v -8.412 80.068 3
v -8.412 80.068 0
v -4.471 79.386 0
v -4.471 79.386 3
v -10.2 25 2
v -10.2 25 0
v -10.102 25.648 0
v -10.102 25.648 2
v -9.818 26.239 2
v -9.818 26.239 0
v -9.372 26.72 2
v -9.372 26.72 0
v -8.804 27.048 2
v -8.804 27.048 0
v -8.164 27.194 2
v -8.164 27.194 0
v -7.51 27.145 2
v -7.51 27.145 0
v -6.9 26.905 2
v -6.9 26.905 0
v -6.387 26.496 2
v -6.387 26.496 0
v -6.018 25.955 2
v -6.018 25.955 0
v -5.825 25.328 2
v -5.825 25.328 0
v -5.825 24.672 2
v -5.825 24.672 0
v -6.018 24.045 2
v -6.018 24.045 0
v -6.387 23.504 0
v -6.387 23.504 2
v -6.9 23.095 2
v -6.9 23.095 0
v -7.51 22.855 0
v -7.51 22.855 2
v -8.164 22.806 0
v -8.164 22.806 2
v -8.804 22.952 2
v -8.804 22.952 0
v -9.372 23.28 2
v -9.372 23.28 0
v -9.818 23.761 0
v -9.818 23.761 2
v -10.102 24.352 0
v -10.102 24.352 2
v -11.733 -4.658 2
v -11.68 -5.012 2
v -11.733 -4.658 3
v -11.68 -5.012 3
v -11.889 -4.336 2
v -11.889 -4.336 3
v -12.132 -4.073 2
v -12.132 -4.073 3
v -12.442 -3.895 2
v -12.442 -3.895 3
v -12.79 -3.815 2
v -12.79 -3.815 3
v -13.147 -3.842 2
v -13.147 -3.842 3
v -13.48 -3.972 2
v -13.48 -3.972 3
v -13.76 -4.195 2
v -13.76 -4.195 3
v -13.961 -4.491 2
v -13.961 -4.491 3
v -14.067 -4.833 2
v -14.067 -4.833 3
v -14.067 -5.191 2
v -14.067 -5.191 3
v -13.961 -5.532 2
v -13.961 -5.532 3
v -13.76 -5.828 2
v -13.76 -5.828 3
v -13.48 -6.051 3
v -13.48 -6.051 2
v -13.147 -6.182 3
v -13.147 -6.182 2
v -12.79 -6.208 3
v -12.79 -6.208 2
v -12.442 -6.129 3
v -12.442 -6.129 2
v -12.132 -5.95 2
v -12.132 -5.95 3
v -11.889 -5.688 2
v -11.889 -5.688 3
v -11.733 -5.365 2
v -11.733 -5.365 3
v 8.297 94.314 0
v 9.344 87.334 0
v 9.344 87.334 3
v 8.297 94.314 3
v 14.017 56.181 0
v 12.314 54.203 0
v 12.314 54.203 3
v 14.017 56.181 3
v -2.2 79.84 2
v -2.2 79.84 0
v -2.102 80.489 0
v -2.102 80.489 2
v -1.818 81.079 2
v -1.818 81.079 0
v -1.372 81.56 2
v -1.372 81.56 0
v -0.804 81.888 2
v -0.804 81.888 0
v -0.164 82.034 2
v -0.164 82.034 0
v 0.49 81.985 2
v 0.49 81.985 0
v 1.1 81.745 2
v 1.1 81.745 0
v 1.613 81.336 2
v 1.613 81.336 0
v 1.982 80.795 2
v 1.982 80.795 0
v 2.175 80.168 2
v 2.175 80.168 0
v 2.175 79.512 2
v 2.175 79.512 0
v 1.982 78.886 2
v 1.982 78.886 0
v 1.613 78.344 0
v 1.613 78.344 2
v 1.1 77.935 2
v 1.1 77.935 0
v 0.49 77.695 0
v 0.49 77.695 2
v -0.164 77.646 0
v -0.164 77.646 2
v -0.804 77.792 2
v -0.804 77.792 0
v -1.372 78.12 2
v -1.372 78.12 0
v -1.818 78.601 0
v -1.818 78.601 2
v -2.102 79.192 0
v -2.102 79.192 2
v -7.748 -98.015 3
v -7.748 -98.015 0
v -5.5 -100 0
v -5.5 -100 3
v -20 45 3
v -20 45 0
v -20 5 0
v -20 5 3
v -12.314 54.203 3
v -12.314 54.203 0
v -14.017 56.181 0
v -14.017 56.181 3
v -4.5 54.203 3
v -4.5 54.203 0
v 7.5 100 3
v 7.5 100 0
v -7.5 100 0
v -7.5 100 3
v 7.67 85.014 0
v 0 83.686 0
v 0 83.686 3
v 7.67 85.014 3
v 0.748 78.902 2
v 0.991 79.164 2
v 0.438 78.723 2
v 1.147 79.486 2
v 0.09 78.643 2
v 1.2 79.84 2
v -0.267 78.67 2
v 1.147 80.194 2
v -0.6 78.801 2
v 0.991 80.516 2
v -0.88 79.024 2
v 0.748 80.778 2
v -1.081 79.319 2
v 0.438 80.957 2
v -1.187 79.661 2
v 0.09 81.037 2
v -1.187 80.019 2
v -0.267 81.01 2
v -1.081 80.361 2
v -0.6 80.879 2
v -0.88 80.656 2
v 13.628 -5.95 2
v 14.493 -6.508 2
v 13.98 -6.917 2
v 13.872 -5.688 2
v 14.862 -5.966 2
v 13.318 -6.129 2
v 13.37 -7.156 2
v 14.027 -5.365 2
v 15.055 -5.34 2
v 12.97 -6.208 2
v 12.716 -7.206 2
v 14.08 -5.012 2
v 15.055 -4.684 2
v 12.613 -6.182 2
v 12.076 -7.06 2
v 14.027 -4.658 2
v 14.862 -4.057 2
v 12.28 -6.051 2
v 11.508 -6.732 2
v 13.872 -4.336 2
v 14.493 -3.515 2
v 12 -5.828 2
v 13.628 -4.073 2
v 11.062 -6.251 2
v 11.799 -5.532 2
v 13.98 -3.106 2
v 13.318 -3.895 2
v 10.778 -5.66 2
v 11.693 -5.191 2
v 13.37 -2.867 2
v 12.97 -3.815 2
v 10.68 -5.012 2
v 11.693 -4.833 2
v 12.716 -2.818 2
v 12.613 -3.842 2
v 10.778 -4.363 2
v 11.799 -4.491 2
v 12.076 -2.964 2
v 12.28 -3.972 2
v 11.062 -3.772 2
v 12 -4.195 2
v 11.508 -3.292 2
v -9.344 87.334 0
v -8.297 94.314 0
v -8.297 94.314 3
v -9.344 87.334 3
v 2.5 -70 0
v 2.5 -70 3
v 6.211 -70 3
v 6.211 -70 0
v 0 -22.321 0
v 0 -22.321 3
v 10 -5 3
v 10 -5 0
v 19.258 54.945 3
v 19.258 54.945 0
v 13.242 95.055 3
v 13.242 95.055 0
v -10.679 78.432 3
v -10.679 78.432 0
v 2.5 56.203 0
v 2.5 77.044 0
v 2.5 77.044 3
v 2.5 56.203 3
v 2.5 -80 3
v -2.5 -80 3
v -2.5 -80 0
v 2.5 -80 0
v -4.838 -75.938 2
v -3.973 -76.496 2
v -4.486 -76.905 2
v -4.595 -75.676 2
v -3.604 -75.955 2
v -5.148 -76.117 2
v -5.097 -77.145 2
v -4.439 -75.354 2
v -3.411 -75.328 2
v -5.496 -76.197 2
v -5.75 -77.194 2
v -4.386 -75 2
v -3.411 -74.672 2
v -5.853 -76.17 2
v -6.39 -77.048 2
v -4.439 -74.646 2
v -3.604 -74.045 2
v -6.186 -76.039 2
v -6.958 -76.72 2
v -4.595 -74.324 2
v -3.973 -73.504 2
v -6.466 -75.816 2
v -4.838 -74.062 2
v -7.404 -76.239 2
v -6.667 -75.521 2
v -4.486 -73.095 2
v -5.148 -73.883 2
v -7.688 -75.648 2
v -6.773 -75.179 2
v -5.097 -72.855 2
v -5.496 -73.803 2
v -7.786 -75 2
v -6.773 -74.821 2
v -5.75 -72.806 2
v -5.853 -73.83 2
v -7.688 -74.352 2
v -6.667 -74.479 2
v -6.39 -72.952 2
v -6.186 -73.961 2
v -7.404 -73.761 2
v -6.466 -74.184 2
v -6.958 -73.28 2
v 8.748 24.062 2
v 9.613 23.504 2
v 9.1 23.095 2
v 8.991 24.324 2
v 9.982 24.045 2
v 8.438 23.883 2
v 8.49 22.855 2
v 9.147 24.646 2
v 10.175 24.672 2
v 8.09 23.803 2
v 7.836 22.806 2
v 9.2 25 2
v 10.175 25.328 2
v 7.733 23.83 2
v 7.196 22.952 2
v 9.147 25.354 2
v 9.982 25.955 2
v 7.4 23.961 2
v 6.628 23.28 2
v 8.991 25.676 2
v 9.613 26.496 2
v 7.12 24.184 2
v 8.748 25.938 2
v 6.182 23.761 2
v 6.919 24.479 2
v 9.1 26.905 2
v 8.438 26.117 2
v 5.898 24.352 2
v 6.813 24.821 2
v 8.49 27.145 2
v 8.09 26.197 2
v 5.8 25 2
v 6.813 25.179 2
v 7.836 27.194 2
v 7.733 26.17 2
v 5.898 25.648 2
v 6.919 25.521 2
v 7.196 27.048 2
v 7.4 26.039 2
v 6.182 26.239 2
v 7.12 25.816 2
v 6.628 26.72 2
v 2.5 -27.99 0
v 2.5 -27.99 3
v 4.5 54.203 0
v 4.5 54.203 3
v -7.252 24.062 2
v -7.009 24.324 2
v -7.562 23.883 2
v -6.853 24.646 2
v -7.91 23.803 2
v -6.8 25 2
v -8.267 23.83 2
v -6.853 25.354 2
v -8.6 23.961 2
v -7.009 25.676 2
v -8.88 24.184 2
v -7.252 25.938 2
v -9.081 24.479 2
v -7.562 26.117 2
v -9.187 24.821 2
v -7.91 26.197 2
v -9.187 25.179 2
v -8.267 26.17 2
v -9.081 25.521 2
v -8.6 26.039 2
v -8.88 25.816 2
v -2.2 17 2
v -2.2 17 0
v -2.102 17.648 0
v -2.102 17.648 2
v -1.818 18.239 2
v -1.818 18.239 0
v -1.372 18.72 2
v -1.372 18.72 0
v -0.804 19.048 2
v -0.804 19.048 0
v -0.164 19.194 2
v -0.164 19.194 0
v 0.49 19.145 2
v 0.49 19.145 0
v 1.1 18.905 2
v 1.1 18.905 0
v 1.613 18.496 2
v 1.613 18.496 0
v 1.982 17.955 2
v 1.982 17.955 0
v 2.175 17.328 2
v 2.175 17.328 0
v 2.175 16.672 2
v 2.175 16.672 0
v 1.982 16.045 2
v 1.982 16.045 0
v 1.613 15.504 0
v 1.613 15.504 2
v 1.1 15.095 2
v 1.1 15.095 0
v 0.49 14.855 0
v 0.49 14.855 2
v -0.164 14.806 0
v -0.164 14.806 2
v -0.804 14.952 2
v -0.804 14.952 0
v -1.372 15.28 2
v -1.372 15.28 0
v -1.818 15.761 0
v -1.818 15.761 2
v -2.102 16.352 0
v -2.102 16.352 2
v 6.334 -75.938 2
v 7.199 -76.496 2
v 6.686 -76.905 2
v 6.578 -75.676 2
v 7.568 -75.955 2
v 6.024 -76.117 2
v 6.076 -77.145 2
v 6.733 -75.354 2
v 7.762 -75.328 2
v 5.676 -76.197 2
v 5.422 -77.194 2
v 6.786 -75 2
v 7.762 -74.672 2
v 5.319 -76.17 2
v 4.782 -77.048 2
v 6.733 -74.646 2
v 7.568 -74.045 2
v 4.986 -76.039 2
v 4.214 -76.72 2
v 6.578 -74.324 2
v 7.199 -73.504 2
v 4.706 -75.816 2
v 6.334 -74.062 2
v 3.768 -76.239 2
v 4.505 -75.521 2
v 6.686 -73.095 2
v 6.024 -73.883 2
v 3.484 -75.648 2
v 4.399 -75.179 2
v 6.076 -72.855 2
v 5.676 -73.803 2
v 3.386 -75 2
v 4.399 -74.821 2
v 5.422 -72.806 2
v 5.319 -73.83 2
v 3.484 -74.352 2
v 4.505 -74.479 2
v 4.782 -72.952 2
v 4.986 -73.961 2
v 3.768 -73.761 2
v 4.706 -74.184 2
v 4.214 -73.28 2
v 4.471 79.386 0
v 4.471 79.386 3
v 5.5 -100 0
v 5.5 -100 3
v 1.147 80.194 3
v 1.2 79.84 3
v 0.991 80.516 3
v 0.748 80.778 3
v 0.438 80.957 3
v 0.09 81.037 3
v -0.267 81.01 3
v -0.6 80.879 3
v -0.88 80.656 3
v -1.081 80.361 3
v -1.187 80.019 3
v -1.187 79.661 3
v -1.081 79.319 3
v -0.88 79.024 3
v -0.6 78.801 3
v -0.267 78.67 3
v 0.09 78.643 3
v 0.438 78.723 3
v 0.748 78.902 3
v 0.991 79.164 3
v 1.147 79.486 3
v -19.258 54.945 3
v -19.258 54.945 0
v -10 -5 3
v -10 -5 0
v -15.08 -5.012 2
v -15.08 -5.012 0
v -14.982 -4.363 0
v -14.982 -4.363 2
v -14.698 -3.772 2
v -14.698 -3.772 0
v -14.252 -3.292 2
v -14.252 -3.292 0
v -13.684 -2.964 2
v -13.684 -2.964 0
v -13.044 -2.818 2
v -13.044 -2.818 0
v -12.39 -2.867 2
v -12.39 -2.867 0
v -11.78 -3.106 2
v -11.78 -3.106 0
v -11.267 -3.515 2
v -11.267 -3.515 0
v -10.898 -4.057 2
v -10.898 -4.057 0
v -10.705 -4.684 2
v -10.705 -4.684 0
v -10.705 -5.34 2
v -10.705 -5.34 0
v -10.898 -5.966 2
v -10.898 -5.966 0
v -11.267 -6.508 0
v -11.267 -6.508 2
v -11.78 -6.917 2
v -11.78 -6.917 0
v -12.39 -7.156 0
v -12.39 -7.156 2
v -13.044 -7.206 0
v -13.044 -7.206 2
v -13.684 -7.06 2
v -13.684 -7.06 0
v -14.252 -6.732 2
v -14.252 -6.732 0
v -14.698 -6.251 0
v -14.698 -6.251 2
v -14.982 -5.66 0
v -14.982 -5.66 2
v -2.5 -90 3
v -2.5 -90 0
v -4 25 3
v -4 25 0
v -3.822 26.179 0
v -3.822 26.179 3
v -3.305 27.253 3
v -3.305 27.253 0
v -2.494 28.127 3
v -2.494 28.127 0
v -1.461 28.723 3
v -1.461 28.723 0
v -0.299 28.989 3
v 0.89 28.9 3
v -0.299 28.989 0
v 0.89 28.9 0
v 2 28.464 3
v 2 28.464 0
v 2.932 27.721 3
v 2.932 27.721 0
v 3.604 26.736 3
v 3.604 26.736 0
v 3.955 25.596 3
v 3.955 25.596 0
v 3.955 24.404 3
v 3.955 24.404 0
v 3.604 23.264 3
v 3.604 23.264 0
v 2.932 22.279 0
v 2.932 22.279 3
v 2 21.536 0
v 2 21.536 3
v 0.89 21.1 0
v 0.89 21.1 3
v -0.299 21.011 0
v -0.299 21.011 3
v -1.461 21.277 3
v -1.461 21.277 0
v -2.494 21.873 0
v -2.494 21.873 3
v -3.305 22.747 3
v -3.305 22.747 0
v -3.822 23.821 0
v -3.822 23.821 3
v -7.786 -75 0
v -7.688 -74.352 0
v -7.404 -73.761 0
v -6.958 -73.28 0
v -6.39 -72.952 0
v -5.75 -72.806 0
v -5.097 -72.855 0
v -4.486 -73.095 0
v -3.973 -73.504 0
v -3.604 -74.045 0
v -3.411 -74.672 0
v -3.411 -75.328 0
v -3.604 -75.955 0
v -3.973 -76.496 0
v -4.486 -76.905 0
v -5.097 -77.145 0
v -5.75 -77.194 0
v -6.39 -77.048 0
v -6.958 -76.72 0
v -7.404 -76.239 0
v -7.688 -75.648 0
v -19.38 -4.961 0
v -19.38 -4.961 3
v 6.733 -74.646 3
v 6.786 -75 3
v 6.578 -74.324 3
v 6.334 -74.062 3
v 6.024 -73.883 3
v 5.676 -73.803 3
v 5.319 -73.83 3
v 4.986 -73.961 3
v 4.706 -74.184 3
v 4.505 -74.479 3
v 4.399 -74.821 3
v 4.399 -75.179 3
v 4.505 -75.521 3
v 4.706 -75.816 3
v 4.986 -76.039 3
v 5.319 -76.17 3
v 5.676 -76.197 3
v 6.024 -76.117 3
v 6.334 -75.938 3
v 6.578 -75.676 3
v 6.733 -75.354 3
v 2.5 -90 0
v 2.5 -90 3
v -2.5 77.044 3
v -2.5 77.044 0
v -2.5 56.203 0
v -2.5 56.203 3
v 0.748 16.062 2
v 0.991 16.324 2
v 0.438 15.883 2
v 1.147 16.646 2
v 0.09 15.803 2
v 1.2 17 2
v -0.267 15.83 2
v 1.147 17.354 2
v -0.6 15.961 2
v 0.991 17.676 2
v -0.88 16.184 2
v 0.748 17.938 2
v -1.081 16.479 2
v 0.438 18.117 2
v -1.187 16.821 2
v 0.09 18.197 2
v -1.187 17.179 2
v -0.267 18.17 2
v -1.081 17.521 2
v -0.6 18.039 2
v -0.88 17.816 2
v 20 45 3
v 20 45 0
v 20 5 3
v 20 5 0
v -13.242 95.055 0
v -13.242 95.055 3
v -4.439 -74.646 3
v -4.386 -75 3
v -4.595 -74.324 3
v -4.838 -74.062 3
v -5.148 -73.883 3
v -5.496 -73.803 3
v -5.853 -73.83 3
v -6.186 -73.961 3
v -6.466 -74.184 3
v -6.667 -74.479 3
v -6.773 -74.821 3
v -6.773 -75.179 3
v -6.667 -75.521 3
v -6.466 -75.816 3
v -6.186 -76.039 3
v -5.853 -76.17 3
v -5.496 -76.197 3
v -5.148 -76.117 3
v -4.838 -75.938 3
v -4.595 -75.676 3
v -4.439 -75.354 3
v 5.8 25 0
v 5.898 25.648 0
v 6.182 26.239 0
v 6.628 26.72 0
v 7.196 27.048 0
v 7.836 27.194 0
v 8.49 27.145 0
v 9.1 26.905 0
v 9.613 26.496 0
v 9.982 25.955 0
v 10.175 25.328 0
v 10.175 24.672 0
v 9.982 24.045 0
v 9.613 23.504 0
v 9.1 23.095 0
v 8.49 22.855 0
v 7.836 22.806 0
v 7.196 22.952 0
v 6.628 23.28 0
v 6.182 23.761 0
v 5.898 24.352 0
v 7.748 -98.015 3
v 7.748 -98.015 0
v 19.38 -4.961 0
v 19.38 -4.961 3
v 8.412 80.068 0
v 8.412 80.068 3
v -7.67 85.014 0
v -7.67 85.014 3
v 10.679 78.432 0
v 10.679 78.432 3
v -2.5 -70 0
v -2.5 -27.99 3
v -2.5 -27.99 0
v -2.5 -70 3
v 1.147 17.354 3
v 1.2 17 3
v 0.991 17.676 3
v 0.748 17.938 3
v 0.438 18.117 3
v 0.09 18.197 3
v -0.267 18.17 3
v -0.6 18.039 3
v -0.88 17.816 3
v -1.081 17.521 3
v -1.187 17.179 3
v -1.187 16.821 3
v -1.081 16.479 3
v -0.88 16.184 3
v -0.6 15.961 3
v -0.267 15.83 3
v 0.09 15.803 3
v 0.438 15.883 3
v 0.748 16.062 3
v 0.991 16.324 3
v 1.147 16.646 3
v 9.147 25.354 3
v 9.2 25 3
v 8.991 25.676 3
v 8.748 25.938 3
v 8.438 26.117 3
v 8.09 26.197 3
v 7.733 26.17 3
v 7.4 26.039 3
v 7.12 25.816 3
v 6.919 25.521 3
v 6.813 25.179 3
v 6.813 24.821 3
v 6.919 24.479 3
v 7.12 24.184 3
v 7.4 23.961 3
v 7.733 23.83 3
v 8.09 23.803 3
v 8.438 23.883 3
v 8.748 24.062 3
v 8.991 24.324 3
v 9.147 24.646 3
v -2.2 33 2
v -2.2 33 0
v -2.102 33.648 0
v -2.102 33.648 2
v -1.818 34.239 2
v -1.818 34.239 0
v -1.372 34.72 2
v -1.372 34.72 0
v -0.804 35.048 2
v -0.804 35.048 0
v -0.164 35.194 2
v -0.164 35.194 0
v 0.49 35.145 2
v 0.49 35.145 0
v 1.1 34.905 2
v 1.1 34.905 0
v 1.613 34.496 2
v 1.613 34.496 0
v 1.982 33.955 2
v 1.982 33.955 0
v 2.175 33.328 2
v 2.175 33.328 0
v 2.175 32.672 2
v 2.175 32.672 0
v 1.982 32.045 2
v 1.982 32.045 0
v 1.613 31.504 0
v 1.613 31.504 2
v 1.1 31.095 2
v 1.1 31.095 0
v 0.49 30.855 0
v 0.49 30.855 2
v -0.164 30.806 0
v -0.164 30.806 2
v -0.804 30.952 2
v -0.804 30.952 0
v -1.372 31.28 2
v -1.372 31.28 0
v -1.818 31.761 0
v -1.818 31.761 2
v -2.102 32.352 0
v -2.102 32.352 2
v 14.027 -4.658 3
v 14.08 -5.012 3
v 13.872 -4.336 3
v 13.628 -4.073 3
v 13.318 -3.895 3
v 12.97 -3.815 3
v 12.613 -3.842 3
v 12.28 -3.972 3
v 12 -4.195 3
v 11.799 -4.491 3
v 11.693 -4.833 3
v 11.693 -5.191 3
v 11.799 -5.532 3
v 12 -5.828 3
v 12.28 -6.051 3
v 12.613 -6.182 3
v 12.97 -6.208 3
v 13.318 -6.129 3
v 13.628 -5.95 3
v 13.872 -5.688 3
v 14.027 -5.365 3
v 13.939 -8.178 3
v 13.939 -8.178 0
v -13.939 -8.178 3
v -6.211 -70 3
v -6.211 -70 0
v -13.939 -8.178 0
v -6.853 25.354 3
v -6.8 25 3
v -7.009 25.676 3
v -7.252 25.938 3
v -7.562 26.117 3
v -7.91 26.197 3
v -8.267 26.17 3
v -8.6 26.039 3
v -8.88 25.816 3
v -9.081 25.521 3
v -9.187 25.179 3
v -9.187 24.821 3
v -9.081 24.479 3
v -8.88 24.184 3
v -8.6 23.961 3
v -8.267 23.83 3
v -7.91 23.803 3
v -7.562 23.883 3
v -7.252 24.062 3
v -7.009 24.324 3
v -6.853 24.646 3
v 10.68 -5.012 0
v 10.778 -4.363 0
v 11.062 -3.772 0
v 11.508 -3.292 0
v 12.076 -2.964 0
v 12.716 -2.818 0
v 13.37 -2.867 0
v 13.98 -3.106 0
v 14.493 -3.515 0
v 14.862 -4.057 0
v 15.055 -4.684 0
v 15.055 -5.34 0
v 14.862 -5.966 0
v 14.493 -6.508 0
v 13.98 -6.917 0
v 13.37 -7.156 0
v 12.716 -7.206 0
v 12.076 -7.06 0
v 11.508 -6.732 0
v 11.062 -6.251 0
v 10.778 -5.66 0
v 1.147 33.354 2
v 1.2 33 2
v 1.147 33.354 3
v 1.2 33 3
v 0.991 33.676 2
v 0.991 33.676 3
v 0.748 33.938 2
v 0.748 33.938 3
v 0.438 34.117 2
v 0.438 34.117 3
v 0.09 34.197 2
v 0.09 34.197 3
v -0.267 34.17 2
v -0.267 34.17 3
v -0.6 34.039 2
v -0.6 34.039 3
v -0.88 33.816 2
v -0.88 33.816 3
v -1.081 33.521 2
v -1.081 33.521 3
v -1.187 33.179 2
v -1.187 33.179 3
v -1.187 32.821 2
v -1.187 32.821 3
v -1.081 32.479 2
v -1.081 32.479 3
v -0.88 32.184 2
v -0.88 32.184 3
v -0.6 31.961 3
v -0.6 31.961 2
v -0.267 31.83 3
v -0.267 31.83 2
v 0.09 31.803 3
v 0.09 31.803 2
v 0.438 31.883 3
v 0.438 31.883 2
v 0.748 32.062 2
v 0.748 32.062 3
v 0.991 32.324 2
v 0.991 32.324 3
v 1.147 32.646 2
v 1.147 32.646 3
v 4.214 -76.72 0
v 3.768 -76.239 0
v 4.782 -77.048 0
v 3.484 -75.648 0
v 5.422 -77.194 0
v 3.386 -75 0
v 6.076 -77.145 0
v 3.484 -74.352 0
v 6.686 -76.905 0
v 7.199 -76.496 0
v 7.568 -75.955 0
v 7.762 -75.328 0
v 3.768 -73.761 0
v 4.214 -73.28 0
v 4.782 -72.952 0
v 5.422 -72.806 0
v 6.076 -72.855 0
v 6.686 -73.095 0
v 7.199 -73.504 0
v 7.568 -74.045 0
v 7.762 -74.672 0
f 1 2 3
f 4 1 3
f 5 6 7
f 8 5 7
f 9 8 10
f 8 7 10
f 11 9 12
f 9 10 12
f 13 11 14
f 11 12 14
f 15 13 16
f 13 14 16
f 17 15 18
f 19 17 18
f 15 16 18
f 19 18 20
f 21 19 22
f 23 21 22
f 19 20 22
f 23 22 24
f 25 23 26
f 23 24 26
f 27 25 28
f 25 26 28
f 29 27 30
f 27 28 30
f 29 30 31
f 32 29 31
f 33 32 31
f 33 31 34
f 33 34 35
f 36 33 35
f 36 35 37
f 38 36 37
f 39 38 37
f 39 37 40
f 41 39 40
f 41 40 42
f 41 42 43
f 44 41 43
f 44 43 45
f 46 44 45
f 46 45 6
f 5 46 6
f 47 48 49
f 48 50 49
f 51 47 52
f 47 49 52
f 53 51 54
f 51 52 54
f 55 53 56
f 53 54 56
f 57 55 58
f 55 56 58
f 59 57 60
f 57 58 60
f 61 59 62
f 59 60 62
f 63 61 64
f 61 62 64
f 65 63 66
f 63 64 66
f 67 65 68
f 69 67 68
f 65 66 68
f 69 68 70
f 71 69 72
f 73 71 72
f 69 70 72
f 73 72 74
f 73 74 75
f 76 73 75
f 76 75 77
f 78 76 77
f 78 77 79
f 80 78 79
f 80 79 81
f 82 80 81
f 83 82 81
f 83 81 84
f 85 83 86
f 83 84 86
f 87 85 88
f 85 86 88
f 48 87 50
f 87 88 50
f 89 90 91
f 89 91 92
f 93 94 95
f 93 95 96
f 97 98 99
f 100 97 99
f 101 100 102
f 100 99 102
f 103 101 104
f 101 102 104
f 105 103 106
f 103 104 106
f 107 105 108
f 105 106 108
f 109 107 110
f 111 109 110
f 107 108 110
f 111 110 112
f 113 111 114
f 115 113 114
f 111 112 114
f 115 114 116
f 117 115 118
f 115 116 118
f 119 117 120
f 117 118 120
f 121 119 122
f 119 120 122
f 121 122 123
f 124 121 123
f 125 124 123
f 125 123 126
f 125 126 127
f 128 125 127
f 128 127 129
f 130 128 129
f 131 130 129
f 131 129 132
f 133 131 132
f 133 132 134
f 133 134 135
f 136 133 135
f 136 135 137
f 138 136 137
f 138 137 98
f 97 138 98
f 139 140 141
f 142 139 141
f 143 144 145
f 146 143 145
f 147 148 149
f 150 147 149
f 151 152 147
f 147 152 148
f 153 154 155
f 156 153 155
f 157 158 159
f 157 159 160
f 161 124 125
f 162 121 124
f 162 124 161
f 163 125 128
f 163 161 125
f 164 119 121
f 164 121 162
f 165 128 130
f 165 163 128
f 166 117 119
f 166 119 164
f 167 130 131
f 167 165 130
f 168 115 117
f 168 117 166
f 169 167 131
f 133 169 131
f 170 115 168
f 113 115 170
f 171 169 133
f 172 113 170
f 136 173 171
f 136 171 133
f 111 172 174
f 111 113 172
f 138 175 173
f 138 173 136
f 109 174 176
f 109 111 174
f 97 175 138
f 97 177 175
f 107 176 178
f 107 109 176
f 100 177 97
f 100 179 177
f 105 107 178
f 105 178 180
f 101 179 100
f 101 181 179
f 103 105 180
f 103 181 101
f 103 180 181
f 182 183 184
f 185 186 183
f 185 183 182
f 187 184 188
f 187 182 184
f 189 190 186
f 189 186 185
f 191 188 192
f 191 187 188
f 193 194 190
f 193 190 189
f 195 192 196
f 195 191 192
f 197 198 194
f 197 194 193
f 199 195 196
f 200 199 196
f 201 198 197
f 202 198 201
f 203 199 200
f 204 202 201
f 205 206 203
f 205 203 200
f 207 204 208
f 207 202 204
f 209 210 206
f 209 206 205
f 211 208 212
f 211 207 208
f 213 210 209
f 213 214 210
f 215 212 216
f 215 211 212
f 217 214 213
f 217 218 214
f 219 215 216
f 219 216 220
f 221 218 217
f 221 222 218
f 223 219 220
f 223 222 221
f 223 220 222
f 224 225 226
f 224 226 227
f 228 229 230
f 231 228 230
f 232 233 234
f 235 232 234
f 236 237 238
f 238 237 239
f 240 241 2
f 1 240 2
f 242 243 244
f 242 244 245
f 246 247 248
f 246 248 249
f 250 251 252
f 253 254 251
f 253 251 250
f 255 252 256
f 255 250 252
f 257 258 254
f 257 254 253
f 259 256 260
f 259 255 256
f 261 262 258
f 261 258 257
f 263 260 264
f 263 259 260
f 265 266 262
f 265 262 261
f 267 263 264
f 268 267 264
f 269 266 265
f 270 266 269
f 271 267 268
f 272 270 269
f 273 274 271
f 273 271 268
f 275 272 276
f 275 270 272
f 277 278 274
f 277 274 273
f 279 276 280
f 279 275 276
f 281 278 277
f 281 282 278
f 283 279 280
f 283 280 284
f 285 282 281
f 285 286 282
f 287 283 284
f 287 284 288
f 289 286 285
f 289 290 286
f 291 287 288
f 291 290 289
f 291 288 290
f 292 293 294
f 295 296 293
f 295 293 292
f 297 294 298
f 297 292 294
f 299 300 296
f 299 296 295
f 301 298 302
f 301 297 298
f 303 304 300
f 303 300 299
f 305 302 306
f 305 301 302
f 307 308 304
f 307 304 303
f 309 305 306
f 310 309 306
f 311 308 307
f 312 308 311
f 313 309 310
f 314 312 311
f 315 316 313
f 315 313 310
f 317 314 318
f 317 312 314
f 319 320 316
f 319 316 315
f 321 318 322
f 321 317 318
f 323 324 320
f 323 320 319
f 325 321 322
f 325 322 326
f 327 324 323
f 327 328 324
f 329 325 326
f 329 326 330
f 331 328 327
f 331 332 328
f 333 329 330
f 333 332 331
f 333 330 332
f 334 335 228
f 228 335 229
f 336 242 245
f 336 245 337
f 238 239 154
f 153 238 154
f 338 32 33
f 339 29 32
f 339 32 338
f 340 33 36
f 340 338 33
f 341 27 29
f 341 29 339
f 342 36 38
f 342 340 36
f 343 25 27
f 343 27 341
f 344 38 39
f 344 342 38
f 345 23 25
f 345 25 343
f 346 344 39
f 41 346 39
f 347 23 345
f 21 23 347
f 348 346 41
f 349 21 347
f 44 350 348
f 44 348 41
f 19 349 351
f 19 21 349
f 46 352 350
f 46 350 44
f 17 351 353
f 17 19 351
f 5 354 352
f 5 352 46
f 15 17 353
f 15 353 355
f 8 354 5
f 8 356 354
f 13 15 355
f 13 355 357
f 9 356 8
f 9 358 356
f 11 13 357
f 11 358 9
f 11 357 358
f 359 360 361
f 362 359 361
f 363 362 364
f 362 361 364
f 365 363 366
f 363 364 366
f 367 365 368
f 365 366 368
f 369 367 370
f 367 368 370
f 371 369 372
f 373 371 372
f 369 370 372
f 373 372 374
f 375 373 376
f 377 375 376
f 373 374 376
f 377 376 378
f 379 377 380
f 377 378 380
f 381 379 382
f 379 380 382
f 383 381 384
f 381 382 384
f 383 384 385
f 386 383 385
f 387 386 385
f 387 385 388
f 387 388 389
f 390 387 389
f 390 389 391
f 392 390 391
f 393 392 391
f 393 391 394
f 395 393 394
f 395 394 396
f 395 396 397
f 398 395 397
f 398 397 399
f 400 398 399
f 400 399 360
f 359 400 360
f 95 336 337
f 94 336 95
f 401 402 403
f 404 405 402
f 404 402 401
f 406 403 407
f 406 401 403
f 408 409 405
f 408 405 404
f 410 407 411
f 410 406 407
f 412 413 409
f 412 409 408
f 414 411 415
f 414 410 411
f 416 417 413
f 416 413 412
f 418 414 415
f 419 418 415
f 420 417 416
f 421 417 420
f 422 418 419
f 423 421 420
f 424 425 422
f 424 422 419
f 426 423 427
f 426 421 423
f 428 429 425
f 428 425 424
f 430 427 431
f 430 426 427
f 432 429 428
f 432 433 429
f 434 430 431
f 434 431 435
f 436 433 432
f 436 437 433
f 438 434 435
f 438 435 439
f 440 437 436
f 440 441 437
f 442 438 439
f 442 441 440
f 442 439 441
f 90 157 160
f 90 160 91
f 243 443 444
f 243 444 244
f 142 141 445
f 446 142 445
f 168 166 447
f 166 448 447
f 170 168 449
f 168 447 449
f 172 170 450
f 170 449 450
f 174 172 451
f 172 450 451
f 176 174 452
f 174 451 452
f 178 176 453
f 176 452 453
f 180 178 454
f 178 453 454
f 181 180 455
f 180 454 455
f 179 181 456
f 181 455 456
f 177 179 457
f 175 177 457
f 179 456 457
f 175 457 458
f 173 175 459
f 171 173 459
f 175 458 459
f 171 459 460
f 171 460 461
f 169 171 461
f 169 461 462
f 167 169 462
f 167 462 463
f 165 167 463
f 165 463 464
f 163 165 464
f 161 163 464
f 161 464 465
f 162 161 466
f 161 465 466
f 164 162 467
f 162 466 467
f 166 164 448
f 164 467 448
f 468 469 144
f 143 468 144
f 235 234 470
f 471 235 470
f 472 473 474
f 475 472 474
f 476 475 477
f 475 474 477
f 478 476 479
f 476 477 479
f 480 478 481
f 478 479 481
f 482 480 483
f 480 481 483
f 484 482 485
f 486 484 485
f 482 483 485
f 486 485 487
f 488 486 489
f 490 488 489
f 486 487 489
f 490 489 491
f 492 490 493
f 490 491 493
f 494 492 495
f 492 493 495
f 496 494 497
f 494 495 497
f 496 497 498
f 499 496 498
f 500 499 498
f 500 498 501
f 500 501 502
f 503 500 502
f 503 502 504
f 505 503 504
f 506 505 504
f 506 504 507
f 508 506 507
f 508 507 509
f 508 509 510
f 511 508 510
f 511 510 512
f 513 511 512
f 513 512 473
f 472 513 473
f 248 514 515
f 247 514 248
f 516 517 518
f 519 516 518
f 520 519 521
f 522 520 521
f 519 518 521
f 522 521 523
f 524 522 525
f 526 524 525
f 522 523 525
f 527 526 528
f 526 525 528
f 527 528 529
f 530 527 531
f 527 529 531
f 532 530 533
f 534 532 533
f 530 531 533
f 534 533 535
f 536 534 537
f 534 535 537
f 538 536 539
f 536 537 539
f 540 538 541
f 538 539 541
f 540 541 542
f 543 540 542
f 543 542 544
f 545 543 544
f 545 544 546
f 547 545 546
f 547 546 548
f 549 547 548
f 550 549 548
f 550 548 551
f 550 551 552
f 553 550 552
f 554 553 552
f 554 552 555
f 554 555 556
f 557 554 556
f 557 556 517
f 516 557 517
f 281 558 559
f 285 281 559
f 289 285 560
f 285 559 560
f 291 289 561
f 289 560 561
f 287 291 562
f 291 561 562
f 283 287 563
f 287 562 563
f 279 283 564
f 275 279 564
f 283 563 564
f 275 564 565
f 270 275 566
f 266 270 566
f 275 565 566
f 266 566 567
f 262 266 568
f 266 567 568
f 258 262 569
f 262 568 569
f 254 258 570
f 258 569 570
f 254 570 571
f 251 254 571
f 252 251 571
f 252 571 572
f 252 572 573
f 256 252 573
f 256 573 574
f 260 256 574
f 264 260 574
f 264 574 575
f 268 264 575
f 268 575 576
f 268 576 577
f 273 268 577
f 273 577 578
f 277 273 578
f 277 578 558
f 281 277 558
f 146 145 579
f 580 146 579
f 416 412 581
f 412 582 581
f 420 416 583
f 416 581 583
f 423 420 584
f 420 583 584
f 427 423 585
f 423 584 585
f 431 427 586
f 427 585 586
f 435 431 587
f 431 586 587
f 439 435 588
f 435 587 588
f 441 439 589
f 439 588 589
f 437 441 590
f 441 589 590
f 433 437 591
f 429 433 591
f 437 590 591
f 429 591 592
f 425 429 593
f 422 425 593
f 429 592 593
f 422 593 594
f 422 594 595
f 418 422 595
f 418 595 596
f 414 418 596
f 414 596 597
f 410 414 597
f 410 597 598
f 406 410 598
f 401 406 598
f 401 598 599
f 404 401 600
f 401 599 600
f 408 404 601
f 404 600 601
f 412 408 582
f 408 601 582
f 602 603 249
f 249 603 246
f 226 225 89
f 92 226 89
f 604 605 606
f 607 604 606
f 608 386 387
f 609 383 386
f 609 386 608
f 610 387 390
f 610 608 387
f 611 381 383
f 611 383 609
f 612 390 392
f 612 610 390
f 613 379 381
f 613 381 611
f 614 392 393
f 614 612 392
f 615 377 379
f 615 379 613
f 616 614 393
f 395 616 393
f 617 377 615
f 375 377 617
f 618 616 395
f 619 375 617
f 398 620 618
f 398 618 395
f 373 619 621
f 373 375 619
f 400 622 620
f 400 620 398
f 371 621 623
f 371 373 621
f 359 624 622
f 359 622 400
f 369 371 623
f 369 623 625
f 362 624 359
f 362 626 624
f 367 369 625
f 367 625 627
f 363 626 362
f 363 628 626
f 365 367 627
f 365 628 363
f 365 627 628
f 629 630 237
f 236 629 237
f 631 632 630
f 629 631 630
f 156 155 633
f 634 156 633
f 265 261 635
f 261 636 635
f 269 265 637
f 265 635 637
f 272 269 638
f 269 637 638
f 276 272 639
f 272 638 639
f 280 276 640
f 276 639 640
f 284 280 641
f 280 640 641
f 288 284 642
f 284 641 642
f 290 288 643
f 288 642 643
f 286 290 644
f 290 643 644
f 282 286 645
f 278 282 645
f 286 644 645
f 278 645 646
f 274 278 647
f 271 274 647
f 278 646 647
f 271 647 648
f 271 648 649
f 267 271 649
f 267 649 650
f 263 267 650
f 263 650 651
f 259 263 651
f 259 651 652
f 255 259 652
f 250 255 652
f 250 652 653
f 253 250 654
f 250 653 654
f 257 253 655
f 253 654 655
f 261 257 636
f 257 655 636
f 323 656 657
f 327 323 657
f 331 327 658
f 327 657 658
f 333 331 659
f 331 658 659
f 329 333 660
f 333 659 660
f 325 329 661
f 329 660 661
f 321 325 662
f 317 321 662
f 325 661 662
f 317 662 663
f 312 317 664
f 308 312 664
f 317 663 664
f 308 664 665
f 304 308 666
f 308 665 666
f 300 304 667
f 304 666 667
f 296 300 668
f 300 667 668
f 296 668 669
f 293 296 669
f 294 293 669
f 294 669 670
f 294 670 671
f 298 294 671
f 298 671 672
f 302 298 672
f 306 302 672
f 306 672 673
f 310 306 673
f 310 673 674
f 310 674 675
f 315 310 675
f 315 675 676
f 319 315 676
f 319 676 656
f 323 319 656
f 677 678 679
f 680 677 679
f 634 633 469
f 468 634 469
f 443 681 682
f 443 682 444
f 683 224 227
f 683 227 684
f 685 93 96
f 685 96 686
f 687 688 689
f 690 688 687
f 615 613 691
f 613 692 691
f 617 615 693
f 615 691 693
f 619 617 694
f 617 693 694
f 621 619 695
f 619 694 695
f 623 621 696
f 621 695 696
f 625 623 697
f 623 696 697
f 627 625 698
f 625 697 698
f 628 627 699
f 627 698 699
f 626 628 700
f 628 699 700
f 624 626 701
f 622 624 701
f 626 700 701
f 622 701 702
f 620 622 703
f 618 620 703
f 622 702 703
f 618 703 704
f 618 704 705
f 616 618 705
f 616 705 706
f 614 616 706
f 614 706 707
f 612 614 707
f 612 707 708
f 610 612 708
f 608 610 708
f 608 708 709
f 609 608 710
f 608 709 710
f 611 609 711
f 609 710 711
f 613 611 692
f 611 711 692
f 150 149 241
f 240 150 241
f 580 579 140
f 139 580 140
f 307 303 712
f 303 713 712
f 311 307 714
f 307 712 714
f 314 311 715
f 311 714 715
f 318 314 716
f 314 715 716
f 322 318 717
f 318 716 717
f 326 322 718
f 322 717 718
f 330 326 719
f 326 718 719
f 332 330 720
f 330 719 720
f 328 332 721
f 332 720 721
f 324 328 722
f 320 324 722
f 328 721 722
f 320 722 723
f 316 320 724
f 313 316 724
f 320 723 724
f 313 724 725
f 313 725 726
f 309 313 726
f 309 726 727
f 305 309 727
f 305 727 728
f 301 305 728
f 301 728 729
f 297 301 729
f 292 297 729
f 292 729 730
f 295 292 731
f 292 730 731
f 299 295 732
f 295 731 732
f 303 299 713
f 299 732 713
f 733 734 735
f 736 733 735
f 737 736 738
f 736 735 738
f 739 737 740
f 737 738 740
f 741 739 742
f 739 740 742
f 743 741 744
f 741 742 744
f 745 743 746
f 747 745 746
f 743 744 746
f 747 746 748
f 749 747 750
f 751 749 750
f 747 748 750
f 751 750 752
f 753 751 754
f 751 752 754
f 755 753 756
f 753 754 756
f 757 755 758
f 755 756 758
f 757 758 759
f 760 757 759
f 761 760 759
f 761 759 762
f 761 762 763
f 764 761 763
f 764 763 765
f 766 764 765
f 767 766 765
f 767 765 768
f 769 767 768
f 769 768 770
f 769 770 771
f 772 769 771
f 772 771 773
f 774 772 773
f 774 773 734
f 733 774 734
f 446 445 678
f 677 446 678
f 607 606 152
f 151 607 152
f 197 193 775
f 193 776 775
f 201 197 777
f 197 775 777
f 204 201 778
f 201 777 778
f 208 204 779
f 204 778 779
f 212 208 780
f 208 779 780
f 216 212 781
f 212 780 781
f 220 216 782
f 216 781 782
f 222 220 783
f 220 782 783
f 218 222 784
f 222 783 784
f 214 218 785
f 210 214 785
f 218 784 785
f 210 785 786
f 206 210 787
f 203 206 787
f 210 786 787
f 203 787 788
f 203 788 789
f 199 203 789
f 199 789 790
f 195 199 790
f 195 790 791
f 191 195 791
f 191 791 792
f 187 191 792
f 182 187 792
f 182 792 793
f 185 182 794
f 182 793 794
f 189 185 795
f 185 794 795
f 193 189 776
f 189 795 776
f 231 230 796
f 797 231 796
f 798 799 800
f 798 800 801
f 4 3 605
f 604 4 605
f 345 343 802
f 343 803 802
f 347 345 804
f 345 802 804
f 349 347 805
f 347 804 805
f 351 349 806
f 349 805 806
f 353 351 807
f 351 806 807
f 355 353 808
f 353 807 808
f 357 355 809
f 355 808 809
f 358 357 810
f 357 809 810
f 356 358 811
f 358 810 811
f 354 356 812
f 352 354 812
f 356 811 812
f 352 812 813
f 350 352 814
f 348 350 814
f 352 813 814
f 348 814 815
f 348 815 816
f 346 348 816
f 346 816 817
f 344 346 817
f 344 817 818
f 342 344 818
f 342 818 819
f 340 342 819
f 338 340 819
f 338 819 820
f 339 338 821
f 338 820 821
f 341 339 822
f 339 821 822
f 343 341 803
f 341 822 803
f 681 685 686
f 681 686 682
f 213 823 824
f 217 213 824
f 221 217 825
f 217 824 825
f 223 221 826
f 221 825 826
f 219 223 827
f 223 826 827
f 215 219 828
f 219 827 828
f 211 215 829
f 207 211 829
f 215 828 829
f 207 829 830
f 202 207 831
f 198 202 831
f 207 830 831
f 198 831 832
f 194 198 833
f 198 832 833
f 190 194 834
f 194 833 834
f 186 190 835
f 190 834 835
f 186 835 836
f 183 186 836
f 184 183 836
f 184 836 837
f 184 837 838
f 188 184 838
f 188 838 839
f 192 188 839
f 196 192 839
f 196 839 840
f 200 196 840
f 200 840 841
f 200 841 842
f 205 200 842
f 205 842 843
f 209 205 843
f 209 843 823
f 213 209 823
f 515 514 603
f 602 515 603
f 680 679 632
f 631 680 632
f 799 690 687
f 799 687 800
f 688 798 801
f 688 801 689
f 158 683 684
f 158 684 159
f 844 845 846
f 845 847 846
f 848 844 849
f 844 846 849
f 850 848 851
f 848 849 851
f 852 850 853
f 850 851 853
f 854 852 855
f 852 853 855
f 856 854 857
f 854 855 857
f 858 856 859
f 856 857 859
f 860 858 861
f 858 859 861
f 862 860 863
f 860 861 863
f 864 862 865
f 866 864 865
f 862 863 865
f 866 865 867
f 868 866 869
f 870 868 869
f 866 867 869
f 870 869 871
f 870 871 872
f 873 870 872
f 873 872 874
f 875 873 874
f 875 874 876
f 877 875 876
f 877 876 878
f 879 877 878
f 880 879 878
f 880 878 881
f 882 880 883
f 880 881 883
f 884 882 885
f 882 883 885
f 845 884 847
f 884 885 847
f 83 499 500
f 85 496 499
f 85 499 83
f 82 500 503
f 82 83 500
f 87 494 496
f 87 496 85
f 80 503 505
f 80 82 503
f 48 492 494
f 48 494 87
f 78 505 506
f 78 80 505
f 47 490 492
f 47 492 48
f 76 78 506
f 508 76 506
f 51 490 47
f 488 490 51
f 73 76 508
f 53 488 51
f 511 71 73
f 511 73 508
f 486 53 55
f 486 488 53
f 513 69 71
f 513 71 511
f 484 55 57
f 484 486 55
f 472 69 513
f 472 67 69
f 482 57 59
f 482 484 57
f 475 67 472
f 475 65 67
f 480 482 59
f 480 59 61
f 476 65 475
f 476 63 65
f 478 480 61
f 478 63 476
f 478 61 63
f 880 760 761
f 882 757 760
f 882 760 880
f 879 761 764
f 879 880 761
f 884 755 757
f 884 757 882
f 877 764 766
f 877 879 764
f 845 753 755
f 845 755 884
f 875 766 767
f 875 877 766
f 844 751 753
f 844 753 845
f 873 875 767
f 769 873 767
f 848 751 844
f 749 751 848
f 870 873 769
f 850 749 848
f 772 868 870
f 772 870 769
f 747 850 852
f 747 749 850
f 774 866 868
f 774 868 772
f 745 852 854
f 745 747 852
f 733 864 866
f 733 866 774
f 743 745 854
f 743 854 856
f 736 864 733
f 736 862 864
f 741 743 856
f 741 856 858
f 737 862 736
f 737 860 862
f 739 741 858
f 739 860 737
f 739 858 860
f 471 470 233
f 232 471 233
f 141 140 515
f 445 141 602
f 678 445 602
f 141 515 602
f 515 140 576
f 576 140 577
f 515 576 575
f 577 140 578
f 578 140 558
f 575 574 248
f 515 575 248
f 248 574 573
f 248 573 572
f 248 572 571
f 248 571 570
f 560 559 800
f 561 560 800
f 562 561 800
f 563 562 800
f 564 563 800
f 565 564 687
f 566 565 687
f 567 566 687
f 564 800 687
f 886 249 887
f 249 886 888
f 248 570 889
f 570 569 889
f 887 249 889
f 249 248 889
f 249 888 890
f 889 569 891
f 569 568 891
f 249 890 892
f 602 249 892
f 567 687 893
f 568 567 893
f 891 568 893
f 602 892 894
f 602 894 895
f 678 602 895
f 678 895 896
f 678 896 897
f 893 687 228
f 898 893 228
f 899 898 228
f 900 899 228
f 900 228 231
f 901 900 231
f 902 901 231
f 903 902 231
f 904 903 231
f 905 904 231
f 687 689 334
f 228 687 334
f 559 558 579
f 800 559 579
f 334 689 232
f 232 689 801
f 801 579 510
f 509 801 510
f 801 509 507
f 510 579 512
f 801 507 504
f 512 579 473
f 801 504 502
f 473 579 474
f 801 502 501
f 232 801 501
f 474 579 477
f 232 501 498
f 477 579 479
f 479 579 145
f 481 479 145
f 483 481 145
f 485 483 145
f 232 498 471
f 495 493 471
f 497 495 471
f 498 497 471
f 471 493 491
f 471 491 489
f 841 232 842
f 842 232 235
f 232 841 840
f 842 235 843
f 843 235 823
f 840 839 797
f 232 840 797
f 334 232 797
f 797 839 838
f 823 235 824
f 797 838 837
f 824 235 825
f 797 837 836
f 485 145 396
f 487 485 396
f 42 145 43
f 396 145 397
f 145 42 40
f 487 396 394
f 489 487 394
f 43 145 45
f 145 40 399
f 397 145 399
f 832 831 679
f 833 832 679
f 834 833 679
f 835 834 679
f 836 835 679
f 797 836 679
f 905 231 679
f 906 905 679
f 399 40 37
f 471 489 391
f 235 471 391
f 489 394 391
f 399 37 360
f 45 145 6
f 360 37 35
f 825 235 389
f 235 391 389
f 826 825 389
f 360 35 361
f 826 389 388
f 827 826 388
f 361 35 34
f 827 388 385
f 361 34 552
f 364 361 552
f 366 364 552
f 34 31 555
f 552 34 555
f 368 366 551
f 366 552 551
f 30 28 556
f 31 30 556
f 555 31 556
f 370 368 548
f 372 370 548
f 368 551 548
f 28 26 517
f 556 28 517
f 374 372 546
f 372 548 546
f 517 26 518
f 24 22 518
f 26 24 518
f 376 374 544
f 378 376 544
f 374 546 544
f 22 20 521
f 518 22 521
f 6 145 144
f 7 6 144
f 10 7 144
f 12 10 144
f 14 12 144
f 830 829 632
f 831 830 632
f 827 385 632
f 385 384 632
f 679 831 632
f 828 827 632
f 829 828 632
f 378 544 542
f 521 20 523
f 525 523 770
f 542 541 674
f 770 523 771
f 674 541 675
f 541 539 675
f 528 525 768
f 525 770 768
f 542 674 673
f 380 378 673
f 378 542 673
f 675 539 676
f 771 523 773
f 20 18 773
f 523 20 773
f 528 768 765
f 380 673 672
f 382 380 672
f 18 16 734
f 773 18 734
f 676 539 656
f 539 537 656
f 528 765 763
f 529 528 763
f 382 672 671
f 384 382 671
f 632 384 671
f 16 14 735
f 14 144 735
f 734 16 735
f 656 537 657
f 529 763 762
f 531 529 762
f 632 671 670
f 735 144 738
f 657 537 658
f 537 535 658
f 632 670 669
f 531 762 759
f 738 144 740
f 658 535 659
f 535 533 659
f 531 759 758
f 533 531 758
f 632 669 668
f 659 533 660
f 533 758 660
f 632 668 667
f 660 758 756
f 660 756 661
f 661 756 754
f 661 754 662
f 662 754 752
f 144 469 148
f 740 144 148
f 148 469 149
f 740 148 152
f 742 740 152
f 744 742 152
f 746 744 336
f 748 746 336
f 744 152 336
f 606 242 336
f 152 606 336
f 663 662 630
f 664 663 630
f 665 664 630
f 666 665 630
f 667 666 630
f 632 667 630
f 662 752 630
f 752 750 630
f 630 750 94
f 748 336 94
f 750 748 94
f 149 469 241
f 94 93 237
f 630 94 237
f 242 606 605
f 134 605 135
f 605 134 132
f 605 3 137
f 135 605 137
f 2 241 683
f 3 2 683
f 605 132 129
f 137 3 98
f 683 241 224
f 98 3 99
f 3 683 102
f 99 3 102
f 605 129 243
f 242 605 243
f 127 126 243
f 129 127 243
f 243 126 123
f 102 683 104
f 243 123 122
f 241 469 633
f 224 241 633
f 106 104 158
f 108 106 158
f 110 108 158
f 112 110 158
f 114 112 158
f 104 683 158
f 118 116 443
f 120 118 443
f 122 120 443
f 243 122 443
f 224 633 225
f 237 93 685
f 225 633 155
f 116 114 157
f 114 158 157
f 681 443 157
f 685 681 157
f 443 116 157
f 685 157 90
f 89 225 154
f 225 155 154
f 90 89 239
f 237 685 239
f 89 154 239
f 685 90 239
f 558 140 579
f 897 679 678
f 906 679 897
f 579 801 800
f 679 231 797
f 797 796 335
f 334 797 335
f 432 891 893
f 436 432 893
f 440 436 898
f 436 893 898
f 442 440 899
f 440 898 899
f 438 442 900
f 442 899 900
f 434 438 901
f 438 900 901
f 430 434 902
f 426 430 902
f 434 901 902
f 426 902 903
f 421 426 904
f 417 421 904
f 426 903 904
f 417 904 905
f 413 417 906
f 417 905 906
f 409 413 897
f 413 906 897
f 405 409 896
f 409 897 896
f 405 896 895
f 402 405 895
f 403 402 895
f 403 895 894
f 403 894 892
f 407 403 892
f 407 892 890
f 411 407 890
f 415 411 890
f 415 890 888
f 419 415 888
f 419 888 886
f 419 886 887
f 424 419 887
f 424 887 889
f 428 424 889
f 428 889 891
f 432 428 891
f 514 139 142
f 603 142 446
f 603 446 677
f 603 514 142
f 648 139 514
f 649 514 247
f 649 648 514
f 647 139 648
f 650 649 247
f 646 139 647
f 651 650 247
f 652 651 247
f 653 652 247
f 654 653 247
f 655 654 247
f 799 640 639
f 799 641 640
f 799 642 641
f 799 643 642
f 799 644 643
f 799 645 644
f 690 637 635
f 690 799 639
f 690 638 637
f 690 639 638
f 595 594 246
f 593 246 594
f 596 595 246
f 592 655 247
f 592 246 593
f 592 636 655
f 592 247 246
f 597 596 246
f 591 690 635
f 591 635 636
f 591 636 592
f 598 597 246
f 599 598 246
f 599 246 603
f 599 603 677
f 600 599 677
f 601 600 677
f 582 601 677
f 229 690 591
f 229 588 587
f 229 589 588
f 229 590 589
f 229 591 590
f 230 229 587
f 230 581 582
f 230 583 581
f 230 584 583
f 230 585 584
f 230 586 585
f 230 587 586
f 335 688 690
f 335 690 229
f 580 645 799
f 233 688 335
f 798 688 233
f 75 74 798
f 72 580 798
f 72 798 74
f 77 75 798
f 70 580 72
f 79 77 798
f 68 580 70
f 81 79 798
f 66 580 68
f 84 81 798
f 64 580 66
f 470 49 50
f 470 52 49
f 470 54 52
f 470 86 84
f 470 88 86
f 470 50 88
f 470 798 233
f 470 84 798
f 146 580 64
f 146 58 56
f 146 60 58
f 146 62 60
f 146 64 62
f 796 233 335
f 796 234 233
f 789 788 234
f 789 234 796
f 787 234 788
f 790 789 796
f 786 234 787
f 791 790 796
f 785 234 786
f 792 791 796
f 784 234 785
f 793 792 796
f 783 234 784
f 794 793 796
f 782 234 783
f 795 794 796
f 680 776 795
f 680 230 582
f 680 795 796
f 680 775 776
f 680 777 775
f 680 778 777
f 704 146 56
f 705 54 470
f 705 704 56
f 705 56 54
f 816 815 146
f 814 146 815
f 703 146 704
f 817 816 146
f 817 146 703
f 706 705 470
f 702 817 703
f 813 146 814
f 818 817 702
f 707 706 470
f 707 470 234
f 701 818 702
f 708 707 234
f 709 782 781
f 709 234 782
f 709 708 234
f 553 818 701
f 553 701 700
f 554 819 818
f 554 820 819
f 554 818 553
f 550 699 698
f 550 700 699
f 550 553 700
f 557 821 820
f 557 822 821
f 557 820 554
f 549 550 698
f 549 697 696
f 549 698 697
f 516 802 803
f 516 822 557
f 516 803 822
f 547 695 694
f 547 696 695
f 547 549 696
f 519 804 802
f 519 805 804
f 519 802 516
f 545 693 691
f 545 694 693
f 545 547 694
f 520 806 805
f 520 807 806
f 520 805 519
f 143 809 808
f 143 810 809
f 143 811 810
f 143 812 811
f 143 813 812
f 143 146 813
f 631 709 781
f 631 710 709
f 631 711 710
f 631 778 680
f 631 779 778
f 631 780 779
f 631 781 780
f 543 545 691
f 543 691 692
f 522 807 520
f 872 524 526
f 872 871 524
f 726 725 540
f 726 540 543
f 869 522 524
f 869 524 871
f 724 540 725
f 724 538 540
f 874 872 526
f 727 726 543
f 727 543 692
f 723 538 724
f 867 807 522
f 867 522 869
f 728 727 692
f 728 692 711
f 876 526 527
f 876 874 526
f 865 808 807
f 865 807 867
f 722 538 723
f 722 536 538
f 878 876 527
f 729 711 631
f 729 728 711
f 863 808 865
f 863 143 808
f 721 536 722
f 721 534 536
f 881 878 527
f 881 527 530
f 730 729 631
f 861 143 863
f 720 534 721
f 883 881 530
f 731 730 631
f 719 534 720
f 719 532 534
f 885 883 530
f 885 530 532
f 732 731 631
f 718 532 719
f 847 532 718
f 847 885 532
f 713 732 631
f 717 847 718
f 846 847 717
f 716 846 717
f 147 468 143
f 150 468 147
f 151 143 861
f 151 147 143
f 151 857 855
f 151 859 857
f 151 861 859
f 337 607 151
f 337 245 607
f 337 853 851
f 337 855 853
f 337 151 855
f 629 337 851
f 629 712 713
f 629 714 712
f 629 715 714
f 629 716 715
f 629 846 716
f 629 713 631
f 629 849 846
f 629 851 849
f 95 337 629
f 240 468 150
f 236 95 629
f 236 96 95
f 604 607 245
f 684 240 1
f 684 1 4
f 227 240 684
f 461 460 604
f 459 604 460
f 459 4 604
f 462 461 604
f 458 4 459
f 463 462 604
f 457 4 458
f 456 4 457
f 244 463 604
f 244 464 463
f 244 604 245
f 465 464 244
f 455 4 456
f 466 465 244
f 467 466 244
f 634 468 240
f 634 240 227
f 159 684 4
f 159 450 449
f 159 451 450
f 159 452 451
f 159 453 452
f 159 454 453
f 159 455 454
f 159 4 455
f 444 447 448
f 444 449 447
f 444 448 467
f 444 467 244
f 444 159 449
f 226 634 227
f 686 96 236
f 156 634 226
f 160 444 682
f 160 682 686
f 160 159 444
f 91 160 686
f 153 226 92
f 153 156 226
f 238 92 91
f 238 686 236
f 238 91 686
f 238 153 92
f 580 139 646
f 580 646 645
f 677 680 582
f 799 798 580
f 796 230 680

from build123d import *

# Parameters (mm, degrees)
EXTRUDE_1_DEPTH              = 3
CUT_EXTRUDE_1_REACH          = 104.025
SKETCH_2_W                   = 5
SKETCH_2_H                   = 10
HOLE_WIZARD_M2_1_D           = 2.4
HOLE_WIZARD_M2_1_CBORE_D     = 4.4
HOLE_WIZARD_M2_1_CBORE_DEPTH = 2
CUT_EXTRUDE_2_REACH          = 104.025
SKETCH_5_R                   = 4
HOLE_WIZARD_M2_2_D           = 2.4
HOLE_WIZARD_M2_2_CBORE_D     = 4.4
HOLE_WIZARD_M2_2_CBORE_DEPTH = 2
HOLE_WIZARD_M2_3_D           = 2.4
HOLE_WIZARD_M2_3_CBORE_D     = 4.4
HOLE_WIZARD_M2_3_CBORE_DEPTH = 2
CUT_EXTRUDE_3_DEPTH          = 3
HOLE_WIZARD_M2_5_D           = 2.4
HOLE_WIZARD_M2_5_CBORE_D     = 4.4
HOLE_WIZARD_M2_5_CBORE_DEPTH = 2


with BuildPart() as part:
    # 草图1 → 凸台-拉伸1 (new body)
    with BuildSketch(Plane.XY):
        Polygon((20, 5), (20, 45), (19.258297735, 54.944681764), (13.241702265, 95.055318236), (7.5, 100), (-7.5, 100), (-13.241702265, 95.055318236), (-19.258297735, 54.944681764), (-20, 45), (-20, 5), (-19.379826327, -4.961389384), (-7.748069469, -98.015444247), (-5.5, -100), (5.5, -100), (7.748069469, -98.015444247), (19.379826327, -4.961389384), align=None)
    extrude(amount=EXTRUDE_1_DEPTH)

    # 草图2 → 切除-拉伸1 (cut, up to next)
    with BuildSketch(Plane.XY.offset(3), mode=Mode.PRIVATE) as cut_extrude_1_sk1:
        Polygon((10, -5), (-10, -5), (0, -22.320508076), align=None)
    cut_extrude_1_tool1 = extrude(cut_extrude_1_sk1.sketch, amount=-CUT_EXTRUDE_1_REACH, mode=Mode.PRIVATE) & part.part
    # 草图2 → 切除-拉伸1 (cut, up to next)
    with BuildSketch(Plane.XY.offset(3), mode=Mode.PRIVATE) as cut_extrude_1_sk2:
        Polygon((6.211088907, -70), (13.938881842, -8.177656525), (2.5, -27.990381057), (2.5, -70), align=None)
    cut_extrude_1_tool2 = extrude(cut_extrude_1_sk2.sketch, amount=-CUT_EXTRUDE_1_REACH, mode=Mode.PRIVATE) & part.part
    # 草图2 → 切除-拉伸1 (cut, up to next)
    with BuildSketch(Plane.XY.offset(3), mode=Mode.PRIVATE) as cut_extrude_1_sk3:
        Polygon((-13.938881842, -8.177656525), (-2.5, -27.990381057), (-2.5, -70), (-6.211088907, -70), align=None)
    cut_extrude_1_tool3 = extrude(cut_extrude_1_sk3.sketch, amount=-CUT_EXTRUDE_1_REACH, mode=Mode.PRIVATE) & part.part
    # 草图2 → 切除-拉伸1 (cut, up to next)
    with BuildSketch(Plane.XY.offset(3), mode=Mode.PRIVATE) as cut_extrude_1_sk4:
        with Locations((0, -85)):
            Rectangle(SKETCH_2_W, SKETCH_2_H)
    cut_extrude_1_tool4 = extrude(cut_extrude_1_sk4.sketch, amount=-CUT_EXTRUDE_1_REACH, mode=Mode.PRIVATE) & part.part
    add(cut_extrude_1_tool1.solids().sort_by_distance((0, -10.773503, 3))[0], mode=Mode.SUBTRACT)
    add(cut_extrude_1_tool2.solids().sort_by_distance((6.712708, -39.914502, 3))[0], mode=Mode.SUBTRACT)
    add(cut_extrude_1_tool3.solids().sort_by_distance((-6.712708, -39.914502, 3))[0], mode=Mode.SUBTRACT)
    add(cut_extrude_1_tool4.solids().sort_by_distance((0, -85, 3))[0], mode=Mode.SUBTRACT)

    # M2 凹头盖螺钉的柱形沉头孔1 (through all)
    with Locations(Plane(origin=(5.586088907, -75, 0), x_dir=(-1, 0, 0), z_dir=(0, 0, -1))):
        with Locations((0, 0), (11.172177814, 0)):
            CounterBoreHole(HOLE_WIZARD_M2_1_D / 2, HOLE_WIZARD_M2_1_CBORE_D / 2, HOLE_WIZARD_M2_1_CBORE_DEPTH)

    # 草图5 → 切除-拉伸2 (cut, up to next)
    with BuildSketch(Plane(origin=(0, 0, 0), x_dir=(-1, 0, 0), z_dir=(0, 0, -1)), mode=Mode.PRIVATE) as cut_extrude_2_sk1:
        with Locations((0, 25)):
            Circle(SKETCH_5_R)
    cut_extrude_2_tool1 = extrude(cut_extrude_2_sk1.sketch, amount=-CUT_EXTRUDE_2_REACH, mode=Mode.PRIVATE) & part.part
    add(cut_extrude_2_tool1.solids().sort_by_distance((0, 25, 0))[0], mode=Mode.SUBTRACT)

    # M2 凹头盖螺钉的柱形沉头孔2 (through all)
    with Locations(Plane(origin=(8, 25, 0), x_dir=(-1, 0, 0), z_dir=(0, 0, -1))):
        with Locations((0, 0), (8, 8), (16, 0), (8, -8)):
            CounterBoreHole(HOLE_WIZARD_M2_2_D / 2, HOLE_WIZARD_M2_2_CBORE_D / 2, HOLE_WIZARD_M2_2_CBORE_DEPTH)

    # M2 凹头盖螺钉的柱形沉头孔3 (through all)
    with Locations(Plane(origin=(12.880020708, -5.011657807, 0), x_dir=(-1, 0, 0), z_dir=(0, 0, -1))):
        with Locations((0, 0), (25.760041416, 0)):
            CounterBoreHole(HOLE_WIZARD_M2_3_D / 2, HOLE_WIZARD_M2_3_CBORE_D / 2, HOLE_WIZARD_M2_3_CBORE_DEPTH)

    # 草图10 → 切除-拉伸3 (cut)
    with BuildSketch(Plane(origin=(0, 0, 0), x_dir=(-1, 0, 0), z_dir=(0, 0, -1))):
        Polygon((-14.016935065, 56.180852205), (-10.679274874, 78.431920145), (-8.411945476, 80.068406675), (-4.470648492, 79.385634325), (-2.5, 77.04424815), (-2.5, 56.2029795), (-4.5, 54.2029795), (-12.313615971, 54.2029795), align=None)
        Polygon((-9.344020618, 87.333615184), (-8.2970205, 94.313615971), (0, 94.313615971), (8.2970205, 94.313615971), (9.344020618, 87.333615184), (7.670053032, 85.014356303), (0, 83.685631227), (-7.670053032, 85.014356303), align=None)
        Polygon((4.5, 54.2029795), (12.313615971, 54.2029795), (14.016935065, 56.180852205), (10.679274874, 78.431920145), (8.411945476, 80.068406675), (4.470648492, 79.385634325), (2.5, 77.04424815), (2.5, 56.2029795), align=None)
    extrude(amount=-CUT_EXTRUDE_3_DEPTH, mode=Mode.SUBTRACT)

    # M2 凹头盖螺钉的柱形沉头孔5 (through all)
    with Locations(Plane(origin=(0, 79.840052868, 0), x_dir=(-1, 0, 0), z_dir=(0, 0, -1))):
        with Locations((0, 0)):
            CounterBoreHole(HOLE_WIZARD_M2_5_D / 2, HOLE_WIZARD_M2_5_CBORE_D / 2, HOLE_WIZARD_M2_5_CBORE_DEPTH)


solid = part.part
